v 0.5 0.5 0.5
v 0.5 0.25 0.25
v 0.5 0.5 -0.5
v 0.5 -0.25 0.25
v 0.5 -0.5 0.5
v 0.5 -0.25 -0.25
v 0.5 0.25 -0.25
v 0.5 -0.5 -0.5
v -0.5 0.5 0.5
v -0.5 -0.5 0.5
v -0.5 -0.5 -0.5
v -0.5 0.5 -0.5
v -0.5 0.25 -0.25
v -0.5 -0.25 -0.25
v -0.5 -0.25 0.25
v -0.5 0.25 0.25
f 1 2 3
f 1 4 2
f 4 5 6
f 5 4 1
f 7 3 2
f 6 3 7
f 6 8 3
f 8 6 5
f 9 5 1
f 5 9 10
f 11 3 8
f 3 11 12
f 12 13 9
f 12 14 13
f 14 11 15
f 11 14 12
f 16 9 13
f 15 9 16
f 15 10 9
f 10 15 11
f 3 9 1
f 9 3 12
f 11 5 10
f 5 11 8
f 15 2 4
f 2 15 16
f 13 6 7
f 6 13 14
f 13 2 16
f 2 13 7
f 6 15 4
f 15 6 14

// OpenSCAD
difference() {
    cube(center = true);
    scale([2, 0.5, 0.5]) cube(center = true);
}
